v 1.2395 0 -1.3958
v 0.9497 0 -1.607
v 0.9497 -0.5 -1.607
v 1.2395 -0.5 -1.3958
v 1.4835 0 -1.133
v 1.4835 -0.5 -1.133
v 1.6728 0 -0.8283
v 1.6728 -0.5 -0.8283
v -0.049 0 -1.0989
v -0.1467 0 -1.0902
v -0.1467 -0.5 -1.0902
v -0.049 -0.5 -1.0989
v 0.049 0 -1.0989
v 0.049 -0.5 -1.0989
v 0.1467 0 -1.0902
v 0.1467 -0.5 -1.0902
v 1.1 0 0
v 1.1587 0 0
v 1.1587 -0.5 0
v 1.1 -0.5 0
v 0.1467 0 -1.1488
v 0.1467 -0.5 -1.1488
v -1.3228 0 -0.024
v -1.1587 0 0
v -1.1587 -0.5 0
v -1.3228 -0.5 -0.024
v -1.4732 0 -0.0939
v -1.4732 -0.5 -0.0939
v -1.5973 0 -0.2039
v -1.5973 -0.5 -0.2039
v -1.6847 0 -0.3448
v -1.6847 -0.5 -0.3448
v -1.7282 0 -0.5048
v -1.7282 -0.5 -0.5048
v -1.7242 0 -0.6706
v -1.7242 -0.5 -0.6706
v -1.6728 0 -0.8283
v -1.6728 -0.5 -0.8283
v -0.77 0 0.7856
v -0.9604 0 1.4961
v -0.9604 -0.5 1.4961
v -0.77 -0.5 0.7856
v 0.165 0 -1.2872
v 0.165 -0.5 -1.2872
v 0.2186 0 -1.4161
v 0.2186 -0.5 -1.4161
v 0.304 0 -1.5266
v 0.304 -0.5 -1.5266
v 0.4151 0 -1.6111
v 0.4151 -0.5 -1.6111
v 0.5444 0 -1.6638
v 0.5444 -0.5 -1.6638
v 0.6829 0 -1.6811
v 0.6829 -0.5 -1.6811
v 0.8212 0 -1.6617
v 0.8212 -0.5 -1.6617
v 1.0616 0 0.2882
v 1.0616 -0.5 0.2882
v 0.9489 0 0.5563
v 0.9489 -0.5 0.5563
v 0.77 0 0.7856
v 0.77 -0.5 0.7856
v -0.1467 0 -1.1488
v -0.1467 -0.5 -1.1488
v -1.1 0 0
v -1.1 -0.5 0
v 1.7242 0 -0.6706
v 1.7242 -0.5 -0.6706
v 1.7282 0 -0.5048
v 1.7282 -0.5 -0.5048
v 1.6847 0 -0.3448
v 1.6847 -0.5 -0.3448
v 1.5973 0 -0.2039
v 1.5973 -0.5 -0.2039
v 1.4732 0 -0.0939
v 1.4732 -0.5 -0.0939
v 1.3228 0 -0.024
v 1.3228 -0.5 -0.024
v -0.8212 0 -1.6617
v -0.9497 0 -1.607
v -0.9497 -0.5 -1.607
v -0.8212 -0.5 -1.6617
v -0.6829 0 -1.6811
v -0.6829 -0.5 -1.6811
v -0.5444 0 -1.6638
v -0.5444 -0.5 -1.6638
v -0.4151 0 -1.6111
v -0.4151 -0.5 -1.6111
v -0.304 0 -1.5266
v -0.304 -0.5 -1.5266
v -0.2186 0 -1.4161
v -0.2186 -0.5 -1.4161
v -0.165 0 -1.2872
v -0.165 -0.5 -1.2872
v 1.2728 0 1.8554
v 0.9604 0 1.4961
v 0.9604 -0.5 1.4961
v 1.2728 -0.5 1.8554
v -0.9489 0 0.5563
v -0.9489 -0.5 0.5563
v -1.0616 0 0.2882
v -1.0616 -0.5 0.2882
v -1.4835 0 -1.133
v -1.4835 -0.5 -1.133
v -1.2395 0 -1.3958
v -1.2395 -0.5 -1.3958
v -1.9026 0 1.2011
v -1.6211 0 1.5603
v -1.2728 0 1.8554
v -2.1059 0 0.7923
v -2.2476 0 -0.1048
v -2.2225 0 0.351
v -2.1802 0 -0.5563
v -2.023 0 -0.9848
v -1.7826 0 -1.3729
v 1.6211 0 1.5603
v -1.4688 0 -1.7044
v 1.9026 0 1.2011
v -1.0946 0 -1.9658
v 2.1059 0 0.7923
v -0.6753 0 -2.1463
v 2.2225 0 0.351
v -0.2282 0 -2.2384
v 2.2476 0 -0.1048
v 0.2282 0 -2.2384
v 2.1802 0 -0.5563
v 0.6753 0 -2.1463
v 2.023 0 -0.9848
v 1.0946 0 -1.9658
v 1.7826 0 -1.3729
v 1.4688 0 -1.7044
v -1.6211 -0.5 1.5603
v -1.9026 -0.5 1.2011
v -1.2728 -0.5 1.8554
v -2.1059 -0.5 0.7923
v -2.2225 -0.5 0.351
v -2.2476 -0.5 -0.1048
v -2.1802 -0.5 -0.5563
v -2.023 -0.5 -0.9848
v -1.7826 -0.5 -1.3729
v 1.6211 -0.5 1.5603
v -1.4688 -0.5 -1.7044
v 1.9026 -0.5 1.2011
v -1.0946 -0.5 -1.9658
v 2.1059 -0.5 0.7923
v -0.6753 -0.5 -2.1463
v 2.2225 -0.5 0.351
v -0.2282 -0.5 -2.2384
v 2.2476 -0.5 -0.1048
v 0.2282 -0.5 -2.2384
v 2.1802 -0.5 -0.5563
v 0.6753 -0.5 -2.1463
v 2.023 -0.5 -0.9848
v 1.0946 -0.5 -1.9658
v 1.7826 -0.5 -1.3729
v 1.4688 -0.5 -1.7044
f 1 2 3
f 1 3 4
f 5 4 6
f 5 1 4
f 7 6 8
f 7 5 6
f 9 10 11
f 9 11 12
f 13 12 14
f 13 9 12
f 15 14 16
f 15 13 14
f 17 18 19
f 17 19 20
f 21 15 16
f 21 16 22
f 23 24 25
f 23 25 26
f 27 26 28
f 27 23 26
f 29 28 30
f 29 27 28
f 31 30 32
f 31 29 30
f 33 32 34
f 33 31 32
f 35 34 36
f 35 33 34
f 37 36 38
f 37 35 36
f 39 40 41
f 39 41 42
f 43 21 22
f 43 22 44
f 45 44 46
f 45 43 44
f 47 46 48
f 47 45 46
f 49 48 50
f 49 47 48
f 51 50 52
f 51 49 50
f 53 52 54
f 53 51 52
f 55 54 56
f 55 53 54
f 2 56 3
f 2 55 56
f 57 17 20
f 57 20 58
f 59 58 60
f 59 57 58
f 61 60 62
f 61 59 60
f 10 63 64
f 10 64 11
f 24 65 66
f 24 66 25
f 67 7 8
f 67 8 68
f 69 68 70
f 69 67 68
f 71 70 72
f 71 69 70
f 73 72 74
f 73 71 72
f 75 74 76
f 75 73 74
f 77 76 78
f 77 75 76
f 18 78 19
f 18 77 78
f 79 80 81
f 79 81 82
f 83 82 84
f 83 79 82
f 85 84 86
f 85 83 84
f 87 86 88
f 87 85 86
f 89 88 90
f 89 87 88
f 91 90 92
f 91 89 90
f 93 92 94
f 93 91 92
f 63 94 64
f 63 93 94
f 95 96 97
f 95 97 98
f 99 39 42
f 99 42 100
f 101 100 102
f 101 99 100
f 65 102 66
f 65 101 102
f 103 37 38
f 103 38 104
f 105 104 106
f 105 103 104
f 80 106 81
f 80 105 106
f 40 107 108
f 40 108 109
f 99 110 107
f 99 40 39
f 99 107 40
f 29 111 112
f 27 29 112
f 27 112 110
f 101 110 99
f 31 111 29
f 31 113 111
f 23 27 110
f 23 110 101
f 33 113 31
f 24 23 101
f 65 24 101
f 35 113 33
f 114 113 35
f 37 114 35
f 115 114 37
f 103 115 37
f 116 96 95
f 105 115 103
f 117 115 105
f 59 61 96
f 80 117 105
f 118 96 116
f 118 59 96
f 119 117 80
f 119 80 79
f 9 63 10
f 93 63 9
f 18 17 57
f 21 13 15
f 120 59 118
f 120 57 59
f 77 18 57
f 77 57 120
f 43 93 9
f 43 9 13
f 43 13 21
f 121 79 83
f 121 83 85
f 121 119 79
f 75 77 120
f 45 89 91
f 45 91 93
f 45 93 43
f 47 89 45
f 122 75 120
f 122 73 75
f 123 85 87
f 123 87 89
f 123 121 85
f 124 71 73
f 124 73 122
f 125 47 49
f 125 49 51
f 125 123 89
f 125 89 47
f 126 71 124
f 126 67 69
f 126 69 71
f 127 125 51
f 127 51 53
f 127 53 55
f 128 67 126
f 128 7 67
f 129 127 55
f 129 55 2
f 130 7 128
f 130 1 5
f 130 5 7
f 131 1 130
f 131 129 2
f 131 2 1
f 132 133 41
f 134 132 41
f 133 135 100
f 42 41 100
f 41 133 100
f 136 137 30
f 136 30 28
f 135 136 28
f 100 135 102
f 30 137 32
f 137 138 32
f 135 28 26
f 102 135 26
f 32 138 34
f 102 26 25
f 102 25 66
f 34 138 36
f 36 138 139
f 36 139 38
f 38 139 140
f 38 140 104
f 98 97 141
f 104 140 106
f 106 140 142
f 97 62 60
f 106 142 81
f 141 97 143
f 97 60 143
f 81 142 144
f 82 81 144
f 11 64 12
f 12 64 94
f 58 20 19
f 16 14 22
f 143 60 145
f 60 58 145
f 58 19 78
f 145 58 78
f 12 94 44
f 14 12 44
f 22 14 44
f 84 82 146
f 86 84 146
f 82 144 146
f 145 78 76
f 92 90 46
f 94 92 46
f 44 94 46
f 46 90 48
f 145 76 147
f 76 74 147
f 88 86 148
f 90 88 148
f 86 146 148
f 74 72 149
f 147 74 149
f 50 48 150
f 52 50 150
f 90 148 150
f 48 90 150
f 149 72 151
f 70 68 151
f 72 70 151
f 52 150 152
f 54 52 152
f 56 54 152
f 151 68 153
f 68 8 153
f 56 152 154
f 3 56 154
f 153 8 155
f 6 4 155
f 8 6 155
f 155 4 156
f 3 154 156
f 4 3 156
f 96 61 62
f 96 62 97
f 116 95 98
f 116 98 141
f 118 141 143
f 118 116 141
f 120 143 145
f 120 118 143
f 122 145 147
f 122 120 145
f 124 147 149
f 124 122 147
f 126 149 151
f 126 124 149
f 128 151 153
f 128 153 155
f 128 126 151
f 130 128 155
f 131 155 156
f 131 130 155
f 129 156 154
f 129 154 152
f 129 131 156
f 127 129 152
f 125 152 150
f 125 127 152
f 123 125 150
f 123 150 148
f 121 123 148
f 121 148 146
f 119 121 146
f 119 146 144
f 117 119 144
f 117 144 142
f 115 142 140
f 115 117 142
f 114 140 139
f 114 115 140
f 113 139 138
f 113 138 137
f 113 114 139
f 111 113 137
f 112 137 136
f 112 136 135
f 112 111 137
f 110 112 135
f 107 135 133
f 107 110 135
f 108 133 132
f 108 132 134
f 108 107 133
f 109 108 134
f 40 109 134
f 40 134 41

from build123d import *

# Parameters (mm, degrees)
BASE_EXTRUDE_DEPTH = 0.5


with BuildPart() as part:
    # Sketch1 → Base-Extrude (new body)
    with BuildSketch(Plane(origin=(0, 0, 0), x_dir=(1, 0, 0), z_dir=(0, 1, 0))):
        with BuildLine():
            Line((0.77, -0.785557127), (0.960376464, -1.496051762))
            Line((0.960376464, -1.496051762), (1.272766377, -1.85541525))
            ThreePointArc((1.272766377, -1.85541525), (0, 2.25), (-1.272766377, -1.85541525))
            Line((-1.272766377, -1.85541525), (-0.960376464, -1.496051762))
            Line((-0.960376464, -1.496051762), (-0.77, -0.785557127))
            ThreePointArc((-0.77, -0.785557127), (-1.01414989, -0.426028168), (-1.1, 0))
            Line((-1.1, 0), (-1.158666667, 0))
            ThreePointArc((-1.158666667, 0), (-1.646127767, 0.271158788), (-1.672819156, 0.828323919))
            ThreePointArc((-1.672819156, 0.828323919), (-1.367825606, 1.270235236), (-0.949656695, 1.607045925))
            ThreePointArc((-0.949656695, 1.607045925), (-0.41511596, 1.61110607), (-0.146666667, 1.148845041))
            Line((-0.146666667, 1.148845041), (-0.146666667, 1.090178375))
            ThreePointArc((-0.146666667, 1.090178375), (0, 1.1), (0.146666667, 1.090178375))
            Line((0.146666667, 1.090178375), (0.146666667, 1.148845041))
            ThreePointArc((0.146666667, 1.148845041), (0.41511596, 1.61110607), (0.949656695, 1.607045925))
            ThreePointArc((0.949656695, 1.607045925), (1.367825606, 1.270235236), (1.672819156, 0.828323919))
            ThreePointArc((1.672819156, 0.828323919), (1.646127767, 0.271158788), (1.158666667, 0))
            Line((1.158666667, 0), (1.1, 0))
            ThreePointArc((1.1, 0), (1.01414989, -0.426028168), (0.77, -0.785557127))
        make_face()
    extrude(amount=-BASE_EXTRUDE_DEPTH)


solid = part.part
